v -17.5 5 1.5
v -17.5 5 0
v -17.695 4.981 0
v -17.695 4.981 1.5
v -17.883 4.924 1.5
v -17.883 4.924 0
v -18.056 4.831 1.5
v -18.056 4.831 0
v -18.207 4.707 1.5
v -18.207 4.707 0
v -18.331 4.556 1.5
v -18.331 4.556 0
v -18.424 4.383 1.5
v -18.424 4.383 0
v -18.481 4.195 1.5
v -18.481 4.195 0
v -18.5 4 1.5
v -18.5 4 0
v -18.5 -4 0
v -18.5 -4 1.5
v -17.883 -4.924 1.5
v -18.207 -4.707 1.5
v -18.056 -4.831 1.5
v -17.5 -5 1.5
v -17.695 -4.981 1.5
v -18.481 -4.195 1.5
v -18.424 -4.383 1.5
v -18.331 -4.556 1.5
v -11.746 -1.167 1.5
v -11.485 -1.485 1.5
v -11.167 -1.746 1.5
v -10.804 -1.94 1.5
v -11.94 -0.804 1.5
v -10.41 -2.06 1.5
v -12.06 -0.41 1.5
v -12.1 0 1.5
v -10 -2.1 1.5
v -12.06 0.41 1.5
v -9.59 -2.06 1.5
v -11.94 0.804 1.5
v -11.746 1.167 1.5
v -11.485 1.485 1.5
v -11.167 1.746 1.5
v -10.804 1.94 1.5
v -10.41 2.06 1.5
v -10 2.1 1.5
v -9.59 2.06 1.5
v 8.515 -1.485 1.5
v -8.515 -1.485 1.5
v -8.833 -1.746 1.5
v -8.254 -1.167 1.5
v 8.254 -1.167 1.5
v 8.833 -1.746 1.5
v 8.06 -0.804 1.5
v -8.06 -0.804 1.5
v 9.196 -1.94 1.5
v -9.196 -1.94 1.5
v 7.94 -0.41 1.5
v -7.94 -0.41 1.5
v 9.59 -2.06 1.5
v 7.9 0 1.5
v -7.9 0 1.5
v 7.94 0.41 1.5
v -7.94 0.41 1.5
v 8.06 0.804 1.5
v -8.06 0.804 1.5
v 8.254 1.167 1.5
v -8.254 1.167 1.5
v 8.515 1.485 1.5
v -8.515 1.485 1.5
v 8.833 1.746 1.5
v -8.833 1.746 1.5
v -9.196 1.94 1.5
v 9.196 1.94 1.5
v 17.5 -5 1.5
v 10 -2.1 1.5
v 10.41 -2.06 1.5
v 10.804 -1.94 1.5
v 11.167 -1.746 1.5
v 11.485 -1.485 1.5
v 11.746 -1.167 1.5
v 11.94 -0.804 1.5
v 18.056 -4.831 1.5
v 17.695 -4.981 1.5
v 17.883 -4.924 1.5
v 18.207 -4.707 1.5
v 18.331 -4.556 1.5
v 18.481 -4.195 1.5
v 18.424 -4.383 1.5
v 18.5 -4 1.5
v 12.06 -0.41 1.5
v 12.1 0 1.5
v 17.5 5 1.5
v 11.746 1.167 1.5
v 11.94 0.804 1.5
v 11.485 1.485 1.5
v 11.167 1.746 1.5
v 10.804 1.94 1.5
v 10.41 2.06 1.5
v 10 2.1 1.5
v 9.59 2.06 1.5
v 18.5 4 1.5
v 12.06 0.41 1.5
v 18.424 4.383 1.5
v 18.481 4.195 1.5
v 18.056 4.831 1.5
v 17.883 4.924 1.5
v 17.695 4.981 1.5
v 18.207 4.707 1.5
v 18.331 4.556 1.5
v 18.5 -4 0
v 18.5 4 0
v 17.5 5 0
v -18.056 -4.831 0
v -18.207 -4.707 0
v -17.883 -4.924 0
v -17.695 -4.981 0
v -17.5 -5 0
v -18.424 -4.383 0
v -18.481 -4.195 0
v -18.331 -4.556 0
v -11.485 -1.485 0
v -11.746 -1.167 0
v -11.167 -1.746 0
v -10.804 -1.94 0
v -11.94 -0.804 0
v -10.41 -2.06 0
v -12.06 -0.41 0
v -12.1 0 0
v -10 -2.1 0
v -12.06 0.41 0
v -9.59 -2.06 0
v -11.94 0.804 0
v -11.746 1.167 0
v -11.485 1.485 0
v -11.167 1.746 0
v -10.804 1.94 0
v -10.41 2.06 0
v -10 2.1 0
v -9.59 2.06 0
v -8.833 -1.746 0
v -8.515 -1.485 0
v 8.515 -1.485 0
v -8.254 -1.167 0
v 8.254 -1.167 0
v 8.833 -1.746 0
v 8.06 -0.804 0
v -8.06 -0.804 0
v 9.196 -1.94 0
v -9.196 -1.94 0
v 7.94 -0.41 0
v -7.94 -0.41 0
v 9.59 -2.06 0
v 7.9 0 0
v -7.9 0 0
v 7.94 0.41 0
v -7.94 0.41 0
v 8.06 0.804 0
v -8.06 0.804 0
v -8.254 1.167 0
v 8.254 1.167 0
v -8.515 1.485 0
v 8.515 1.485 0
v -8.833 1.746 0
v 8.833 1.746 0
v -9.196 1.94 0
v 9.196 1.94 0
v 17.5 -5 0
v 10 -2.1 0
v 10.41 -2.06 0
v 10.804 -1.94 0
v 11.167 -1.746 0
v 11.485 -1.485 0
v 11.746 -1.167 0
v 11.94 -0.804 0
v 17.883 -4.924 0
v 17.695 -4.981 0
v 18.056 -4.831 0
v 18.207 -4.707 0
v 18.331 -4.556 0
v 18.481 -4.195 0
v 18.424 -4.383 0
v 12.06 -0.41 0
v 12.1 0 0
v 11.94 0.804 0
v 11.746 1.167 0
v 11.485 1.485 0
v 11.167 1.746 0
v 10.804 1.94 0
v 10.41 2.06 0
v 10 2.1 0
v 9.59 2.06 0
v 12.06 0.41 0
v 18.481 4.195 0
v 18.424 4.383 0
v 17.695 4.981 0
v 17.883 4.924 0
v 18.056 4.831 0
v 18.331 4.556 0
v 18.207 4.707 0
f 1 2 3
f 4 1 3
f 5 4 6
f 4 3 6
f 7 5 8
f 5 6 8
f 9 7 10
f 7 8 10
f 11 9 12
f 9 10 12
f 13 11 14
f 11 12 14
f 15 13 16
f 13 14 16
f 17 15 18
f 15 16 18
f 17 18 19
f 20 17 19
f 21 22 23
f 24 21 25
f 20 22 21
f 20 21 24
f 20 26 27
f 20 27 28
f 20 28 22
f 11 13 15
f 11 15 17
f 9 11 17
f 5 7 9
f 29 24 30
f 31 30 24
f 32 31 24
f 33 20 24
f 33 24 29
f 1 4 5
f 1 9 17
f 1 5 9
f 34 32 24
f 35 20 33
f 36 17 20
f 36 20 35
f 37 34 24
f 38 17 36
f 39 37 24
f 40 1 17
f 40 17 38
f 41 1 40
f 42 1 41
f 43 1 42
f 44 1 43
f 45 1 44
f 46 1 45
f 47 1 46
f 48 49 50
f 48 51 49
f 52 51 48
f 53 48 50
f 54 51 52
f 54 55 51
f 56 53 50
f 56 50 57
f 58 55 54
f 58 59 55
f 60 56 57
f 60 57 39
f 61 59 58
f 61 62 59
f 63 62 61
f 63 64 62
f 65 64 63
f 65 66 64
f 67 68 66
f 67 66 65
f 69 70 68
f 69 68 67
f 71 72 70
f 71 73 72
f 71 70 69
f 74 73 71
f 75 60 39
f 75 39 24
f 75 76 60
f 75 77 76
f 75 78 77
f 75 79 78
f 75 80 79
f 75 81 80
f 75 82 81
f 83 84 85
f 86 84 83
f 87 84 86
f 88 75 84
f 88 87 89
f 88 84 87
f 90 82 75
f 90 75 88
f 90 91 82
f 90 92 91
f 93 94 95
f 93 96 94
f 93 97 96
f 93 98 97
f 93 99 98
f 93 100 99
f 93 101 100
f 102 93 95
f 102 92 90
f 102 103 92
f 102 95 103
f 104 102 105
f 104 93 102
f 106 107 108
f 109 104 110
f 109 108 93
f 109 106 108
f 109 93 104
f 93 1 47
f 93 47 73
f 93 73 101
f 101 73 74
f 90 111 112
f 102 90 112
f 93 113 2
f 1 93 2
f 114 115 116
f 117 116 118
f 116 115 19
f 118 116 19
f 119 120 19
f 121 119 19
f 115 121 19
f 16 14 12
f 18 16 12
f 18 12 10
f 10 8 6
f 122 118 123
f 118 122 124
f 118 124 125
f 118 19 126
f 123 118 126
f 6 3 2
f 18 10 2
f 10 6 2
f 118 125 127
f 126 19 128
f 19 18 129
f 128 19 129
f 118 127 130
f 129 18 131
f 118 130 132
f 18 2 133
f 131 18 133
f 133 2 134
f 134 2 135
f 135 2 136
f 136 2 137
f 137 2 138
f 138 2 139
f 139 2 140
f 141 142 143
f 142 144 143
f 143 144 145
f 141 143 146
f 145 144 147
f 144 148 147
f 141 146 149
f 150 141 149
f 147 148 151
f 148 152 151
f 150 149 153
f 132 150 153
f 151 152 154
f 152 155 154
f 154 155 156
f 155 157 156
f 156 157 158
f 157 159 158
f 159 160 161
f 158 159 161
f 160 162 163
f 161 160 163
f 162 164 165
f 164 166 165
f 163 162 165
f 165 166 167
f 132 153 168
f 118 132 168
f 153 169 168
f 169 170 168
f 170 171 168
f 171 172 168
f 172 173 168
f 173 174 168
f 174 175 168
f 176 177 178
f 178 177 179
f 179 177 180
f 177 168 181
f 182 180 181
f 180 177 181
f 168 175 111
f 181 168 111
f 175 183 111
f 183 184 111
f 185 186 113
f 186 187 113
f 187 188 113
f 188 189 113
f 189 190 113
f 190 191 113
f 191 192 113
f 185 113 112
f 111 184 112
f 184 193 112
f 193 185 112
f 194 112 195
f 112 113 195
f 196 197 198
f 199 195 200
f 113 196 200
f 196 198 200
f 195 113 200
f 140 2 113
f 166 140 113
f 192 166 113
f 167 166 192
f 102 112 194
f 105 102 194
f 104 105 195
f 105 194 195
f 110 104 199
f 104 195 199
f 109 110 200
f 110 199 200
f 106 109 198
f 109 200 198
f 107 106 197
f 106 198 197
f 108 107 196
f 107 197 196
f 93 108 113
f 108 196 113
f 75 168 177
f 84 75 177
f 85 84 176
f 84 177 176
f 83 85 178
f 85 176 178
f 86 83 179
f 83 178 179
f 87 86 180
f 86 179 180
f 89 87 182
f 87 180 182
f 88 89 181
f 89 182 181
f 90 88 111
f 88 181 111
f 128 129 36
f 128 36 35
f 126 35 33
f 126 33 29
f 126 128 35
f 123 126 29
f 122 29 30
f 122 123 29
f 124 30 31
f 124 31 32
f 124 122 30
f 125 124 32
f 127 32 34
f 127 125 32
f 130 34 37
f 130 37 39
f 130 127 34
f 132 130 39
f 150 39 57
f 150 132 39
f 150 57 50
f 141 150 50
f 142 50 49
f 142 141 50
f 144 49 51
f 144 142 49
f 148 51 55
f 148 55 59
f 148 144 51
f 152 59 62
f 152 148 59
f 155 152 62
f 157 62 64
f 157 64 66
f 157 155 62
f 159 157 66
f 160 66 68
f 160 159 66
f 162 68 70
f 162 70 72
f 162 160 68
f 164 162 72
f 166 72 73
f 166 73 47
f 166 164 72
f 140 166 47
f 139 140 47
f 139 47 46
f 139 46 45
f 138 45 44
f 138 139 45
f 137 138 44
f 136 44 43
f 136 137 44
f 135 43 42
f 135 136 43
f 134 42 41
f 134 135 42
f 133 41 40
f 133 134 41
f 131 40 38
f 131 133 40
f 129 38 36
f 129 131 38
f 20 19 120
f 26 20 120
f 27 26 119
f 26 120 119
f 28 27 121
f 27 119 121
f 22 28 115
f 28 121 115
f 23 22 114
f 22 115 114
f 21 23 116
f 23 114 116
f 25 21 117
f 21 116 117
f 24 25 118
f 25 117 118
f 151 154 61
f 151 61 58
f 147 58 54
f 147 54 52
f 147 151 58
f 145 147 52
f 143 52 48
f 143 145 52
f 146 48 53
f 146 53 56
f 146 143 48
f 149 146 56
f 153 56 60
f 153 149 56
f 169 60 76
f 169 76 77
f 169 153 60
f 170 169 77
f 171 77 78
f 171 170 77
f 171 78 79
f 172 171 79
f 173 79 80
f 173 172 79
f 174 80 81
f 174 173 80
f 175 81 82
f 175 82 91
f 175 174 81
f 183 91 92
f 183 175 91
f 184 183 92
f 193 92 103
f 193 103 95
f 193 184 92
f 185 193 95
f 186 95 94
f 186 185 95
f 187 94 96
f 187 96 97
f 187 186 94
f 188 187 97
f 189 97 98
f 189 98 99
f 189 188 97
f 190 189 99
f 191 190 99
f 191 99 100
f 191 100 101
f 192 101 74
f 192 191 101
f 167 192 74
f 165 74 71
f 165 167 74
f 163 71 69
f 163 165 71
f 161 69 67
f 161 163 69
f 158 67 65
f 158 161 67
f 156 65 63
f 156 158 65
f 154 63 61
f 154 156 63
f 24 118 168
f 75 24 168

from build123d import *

# Parameters (mm, degrees)
SKETCH1_R           = 2.1
BOSS_EXTRUDE1_DEPTH = 1.5


with BuildPart() as part:
    # Sketch1 → Boss-Extrude1 (new body)
    with BuildSketch(Plane.XY):
        with BuildLine():
            Line((-17.5, -5), (17.5, -5))
            ThreePointArc((17.5, -5), (18.207106781, -4.707106781), (18.5, -4))
            Line((18.5, -4), (18.5, 4))
            ThreePointArc((18.5, 4), (18.207106781, 4.707106781), (17.5, 5))
            Line((17.5, 5), (-17.5, 5))
            ThreePointArc((-17.5, 5), (-18.207106781, 4.707106781), (-18.5, 4))
            Line((-18.5, 4), (-18.5, -4))
            ThreePointArc((-18.5, -4), (-18.207106781, -4.707106781), (-17.5, -5))
        make_face()
        with Locations(Location((-10, 0, 0), (0, 0, 180))):
            Circle(SKETCH1_R, mode=Mode.SUBTRACT)
        with Locations(Location((10, 0, 0), (0, 0, 180))):
            Circle(SKETCH1_R, mode=Mode.SUBTRACT)
    extrude(amount=BOSS_EXTRUDE1_DEPTH)


solid = part.part
